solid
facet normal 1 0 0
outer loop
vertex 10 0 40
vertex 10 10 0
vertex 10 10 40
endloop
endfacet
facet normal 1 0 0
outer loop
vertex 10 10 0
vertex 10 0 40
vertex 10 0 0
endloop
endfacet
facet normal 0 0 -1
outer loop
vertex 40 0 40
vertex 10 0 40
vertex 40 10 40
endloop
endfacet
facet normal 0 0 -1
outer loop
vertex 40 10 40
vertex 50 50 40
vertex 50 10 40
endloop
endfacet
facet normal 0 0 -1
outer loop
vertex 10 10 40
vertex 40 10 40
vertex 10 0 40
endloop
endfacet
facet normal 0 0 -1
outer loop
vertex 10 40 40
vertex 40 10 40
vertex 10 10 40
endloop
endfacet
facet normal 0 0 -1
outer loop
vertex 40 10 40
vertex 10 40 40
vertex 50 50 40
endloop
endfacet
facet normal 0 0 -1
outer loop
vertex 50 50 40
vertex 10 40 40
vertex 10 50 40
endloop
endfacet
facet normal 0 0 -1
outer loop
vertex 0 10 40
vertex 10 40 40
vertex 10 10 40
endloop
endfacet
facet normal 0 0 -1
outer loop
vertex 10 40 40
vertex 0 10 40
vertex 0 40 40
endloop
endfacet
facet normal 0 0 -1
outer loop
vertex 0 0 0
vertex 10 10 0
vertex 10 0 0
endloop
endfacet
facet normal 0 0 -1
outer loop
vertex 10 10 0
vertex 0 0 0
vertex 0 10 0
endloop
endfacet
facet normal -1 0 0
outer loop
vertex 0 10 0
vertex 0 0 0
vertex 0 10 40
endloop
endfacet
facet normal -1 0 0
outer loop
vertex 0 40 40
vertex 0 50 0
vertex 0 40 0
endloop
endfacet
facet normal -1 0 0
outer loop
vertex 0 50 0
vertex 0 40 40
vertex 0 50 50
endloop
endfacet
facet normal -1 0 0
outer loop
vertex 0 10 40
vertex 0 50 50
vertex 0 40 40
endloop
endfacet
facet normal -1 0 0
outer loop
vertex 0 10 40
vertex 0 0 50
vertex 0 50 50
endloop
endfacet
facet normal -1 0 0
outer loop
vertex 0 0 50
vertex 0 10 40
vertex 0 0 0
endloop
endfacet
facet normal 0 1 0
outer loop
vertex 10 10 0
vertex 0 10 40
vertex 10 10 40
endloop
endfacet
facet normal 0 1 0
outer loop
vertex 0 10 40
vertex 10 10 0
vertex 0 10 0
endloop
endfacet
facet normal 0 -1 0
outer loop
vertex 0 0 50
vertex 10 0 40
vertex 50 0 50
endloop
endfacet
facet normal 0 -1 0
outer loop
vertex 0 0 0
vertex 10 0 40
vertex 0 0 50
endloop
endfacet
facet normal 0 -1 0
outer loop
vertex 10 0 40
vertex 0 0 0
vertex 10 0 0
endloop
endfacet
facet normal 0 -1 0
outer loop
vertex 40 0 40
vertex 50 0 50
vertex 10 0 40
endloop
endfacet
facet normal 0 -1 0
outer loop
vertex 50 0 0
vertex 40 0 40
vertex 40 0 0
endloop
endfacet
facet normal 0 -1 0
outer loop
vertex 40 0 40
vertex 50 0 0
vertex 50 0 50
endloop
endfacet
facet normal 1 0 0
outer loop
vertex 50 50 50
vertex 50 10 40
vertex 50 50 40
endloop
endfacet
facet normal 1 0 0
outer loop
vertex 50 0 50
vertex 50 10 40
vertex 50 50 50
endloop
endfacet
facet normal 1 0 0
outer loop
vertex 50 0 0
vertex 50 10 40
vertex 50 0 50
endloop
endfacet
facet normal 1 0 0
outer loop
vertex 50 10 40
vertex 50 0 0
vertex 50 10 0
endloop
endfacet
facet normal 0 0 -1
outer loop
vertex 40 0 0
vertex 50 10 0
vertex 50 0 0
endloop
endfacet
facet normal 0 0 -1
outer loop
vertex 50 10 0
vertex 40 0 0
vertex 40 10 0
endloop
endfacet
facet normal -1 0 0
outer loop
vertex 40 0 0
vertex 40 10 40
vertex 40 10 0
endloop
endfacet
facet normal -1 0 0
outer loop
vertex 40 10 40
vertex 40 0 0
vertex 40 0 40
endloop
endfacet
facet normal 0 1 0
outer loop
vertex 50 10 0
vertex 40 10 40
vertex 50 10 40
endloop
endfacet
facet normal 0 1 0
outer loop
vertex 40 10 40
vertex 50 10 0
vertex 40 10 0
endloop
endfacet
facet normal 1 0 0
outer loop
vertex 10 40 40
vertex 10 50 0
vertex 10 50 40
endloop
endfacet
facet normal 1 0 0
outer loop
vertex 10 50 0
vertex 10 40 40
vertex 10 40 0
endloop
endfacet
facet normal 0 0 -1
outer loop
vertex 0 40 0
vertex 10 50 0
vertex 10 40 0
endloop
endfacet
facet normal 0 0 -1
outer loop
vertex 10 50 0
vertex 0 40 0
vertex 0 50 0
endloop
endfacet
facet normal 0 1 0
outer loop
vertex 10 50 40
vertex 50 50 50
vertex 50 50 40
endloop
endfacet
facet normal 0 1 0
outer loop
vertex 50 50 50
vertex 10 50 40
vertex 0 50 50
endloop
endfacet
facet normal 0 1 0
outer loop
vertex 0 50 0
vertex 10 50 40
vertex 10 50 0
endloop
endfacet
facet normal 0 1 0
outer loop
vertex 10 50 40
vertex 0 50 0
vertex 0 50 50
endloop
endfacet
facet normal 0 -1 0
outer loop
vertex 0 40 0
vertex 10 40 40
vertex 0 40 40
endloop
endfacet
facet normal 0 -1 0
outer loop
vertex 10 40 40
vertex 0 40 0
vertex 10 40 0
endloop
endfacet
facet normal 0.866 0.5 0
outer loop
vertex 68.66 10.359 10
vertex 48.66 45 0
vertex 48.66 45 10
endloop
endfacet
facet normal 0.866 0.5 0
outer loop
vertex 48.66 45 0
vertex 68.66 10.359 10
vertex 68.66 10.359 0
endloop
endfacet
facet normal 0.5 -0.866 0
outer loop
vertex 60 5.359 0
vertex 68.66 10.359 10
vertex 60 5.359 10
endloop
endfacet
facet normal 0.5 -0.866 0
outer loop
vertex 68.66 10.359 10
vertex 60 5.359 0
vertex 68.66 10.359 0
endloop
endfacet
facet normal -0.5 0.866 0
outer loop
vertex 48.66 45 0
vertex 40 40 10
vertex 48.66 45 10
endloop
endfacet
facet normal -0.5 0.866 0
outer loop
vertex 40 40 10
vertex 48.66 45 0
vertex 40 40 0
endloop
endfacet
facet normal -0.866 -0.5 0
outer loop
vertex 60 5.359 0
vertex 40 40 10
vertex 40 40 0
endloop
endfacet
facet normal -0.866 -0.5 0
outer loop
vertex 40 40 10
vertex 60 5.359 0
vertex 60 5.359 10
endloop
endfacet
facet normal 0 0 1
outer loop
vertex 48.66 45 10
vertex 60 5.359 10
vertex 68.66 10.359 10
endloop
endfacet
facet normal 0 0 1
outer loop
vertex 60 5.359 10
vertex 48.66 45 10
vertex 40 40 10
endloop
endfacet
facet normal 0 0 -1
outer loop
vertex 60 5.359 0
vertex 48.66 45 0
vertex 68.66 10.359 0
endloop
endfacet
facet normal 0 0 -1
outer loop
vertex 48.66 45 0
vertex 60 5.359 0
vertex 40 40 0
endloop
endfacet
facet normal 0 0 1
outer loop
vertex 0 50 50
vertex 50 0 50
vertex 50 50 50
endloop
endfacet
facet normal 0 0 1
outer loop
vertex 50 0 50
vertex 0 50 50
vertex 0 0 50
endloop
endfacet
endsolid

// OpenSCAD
module broken_stool() {
    cube([10,10,40]);
    translate([40,0,0]) {
        cube([10,10,40]);
    }
    translate([0,40,0]) {
        cube([10,10,40]);
    }
    translate([40,40,0]) {
        rotate([90,0,30]) {
            cube([10,10,40]);
        }
    }
    translate([0,0,40]) {
        cube([50,50,10]);
    }
}

broken_stool();
